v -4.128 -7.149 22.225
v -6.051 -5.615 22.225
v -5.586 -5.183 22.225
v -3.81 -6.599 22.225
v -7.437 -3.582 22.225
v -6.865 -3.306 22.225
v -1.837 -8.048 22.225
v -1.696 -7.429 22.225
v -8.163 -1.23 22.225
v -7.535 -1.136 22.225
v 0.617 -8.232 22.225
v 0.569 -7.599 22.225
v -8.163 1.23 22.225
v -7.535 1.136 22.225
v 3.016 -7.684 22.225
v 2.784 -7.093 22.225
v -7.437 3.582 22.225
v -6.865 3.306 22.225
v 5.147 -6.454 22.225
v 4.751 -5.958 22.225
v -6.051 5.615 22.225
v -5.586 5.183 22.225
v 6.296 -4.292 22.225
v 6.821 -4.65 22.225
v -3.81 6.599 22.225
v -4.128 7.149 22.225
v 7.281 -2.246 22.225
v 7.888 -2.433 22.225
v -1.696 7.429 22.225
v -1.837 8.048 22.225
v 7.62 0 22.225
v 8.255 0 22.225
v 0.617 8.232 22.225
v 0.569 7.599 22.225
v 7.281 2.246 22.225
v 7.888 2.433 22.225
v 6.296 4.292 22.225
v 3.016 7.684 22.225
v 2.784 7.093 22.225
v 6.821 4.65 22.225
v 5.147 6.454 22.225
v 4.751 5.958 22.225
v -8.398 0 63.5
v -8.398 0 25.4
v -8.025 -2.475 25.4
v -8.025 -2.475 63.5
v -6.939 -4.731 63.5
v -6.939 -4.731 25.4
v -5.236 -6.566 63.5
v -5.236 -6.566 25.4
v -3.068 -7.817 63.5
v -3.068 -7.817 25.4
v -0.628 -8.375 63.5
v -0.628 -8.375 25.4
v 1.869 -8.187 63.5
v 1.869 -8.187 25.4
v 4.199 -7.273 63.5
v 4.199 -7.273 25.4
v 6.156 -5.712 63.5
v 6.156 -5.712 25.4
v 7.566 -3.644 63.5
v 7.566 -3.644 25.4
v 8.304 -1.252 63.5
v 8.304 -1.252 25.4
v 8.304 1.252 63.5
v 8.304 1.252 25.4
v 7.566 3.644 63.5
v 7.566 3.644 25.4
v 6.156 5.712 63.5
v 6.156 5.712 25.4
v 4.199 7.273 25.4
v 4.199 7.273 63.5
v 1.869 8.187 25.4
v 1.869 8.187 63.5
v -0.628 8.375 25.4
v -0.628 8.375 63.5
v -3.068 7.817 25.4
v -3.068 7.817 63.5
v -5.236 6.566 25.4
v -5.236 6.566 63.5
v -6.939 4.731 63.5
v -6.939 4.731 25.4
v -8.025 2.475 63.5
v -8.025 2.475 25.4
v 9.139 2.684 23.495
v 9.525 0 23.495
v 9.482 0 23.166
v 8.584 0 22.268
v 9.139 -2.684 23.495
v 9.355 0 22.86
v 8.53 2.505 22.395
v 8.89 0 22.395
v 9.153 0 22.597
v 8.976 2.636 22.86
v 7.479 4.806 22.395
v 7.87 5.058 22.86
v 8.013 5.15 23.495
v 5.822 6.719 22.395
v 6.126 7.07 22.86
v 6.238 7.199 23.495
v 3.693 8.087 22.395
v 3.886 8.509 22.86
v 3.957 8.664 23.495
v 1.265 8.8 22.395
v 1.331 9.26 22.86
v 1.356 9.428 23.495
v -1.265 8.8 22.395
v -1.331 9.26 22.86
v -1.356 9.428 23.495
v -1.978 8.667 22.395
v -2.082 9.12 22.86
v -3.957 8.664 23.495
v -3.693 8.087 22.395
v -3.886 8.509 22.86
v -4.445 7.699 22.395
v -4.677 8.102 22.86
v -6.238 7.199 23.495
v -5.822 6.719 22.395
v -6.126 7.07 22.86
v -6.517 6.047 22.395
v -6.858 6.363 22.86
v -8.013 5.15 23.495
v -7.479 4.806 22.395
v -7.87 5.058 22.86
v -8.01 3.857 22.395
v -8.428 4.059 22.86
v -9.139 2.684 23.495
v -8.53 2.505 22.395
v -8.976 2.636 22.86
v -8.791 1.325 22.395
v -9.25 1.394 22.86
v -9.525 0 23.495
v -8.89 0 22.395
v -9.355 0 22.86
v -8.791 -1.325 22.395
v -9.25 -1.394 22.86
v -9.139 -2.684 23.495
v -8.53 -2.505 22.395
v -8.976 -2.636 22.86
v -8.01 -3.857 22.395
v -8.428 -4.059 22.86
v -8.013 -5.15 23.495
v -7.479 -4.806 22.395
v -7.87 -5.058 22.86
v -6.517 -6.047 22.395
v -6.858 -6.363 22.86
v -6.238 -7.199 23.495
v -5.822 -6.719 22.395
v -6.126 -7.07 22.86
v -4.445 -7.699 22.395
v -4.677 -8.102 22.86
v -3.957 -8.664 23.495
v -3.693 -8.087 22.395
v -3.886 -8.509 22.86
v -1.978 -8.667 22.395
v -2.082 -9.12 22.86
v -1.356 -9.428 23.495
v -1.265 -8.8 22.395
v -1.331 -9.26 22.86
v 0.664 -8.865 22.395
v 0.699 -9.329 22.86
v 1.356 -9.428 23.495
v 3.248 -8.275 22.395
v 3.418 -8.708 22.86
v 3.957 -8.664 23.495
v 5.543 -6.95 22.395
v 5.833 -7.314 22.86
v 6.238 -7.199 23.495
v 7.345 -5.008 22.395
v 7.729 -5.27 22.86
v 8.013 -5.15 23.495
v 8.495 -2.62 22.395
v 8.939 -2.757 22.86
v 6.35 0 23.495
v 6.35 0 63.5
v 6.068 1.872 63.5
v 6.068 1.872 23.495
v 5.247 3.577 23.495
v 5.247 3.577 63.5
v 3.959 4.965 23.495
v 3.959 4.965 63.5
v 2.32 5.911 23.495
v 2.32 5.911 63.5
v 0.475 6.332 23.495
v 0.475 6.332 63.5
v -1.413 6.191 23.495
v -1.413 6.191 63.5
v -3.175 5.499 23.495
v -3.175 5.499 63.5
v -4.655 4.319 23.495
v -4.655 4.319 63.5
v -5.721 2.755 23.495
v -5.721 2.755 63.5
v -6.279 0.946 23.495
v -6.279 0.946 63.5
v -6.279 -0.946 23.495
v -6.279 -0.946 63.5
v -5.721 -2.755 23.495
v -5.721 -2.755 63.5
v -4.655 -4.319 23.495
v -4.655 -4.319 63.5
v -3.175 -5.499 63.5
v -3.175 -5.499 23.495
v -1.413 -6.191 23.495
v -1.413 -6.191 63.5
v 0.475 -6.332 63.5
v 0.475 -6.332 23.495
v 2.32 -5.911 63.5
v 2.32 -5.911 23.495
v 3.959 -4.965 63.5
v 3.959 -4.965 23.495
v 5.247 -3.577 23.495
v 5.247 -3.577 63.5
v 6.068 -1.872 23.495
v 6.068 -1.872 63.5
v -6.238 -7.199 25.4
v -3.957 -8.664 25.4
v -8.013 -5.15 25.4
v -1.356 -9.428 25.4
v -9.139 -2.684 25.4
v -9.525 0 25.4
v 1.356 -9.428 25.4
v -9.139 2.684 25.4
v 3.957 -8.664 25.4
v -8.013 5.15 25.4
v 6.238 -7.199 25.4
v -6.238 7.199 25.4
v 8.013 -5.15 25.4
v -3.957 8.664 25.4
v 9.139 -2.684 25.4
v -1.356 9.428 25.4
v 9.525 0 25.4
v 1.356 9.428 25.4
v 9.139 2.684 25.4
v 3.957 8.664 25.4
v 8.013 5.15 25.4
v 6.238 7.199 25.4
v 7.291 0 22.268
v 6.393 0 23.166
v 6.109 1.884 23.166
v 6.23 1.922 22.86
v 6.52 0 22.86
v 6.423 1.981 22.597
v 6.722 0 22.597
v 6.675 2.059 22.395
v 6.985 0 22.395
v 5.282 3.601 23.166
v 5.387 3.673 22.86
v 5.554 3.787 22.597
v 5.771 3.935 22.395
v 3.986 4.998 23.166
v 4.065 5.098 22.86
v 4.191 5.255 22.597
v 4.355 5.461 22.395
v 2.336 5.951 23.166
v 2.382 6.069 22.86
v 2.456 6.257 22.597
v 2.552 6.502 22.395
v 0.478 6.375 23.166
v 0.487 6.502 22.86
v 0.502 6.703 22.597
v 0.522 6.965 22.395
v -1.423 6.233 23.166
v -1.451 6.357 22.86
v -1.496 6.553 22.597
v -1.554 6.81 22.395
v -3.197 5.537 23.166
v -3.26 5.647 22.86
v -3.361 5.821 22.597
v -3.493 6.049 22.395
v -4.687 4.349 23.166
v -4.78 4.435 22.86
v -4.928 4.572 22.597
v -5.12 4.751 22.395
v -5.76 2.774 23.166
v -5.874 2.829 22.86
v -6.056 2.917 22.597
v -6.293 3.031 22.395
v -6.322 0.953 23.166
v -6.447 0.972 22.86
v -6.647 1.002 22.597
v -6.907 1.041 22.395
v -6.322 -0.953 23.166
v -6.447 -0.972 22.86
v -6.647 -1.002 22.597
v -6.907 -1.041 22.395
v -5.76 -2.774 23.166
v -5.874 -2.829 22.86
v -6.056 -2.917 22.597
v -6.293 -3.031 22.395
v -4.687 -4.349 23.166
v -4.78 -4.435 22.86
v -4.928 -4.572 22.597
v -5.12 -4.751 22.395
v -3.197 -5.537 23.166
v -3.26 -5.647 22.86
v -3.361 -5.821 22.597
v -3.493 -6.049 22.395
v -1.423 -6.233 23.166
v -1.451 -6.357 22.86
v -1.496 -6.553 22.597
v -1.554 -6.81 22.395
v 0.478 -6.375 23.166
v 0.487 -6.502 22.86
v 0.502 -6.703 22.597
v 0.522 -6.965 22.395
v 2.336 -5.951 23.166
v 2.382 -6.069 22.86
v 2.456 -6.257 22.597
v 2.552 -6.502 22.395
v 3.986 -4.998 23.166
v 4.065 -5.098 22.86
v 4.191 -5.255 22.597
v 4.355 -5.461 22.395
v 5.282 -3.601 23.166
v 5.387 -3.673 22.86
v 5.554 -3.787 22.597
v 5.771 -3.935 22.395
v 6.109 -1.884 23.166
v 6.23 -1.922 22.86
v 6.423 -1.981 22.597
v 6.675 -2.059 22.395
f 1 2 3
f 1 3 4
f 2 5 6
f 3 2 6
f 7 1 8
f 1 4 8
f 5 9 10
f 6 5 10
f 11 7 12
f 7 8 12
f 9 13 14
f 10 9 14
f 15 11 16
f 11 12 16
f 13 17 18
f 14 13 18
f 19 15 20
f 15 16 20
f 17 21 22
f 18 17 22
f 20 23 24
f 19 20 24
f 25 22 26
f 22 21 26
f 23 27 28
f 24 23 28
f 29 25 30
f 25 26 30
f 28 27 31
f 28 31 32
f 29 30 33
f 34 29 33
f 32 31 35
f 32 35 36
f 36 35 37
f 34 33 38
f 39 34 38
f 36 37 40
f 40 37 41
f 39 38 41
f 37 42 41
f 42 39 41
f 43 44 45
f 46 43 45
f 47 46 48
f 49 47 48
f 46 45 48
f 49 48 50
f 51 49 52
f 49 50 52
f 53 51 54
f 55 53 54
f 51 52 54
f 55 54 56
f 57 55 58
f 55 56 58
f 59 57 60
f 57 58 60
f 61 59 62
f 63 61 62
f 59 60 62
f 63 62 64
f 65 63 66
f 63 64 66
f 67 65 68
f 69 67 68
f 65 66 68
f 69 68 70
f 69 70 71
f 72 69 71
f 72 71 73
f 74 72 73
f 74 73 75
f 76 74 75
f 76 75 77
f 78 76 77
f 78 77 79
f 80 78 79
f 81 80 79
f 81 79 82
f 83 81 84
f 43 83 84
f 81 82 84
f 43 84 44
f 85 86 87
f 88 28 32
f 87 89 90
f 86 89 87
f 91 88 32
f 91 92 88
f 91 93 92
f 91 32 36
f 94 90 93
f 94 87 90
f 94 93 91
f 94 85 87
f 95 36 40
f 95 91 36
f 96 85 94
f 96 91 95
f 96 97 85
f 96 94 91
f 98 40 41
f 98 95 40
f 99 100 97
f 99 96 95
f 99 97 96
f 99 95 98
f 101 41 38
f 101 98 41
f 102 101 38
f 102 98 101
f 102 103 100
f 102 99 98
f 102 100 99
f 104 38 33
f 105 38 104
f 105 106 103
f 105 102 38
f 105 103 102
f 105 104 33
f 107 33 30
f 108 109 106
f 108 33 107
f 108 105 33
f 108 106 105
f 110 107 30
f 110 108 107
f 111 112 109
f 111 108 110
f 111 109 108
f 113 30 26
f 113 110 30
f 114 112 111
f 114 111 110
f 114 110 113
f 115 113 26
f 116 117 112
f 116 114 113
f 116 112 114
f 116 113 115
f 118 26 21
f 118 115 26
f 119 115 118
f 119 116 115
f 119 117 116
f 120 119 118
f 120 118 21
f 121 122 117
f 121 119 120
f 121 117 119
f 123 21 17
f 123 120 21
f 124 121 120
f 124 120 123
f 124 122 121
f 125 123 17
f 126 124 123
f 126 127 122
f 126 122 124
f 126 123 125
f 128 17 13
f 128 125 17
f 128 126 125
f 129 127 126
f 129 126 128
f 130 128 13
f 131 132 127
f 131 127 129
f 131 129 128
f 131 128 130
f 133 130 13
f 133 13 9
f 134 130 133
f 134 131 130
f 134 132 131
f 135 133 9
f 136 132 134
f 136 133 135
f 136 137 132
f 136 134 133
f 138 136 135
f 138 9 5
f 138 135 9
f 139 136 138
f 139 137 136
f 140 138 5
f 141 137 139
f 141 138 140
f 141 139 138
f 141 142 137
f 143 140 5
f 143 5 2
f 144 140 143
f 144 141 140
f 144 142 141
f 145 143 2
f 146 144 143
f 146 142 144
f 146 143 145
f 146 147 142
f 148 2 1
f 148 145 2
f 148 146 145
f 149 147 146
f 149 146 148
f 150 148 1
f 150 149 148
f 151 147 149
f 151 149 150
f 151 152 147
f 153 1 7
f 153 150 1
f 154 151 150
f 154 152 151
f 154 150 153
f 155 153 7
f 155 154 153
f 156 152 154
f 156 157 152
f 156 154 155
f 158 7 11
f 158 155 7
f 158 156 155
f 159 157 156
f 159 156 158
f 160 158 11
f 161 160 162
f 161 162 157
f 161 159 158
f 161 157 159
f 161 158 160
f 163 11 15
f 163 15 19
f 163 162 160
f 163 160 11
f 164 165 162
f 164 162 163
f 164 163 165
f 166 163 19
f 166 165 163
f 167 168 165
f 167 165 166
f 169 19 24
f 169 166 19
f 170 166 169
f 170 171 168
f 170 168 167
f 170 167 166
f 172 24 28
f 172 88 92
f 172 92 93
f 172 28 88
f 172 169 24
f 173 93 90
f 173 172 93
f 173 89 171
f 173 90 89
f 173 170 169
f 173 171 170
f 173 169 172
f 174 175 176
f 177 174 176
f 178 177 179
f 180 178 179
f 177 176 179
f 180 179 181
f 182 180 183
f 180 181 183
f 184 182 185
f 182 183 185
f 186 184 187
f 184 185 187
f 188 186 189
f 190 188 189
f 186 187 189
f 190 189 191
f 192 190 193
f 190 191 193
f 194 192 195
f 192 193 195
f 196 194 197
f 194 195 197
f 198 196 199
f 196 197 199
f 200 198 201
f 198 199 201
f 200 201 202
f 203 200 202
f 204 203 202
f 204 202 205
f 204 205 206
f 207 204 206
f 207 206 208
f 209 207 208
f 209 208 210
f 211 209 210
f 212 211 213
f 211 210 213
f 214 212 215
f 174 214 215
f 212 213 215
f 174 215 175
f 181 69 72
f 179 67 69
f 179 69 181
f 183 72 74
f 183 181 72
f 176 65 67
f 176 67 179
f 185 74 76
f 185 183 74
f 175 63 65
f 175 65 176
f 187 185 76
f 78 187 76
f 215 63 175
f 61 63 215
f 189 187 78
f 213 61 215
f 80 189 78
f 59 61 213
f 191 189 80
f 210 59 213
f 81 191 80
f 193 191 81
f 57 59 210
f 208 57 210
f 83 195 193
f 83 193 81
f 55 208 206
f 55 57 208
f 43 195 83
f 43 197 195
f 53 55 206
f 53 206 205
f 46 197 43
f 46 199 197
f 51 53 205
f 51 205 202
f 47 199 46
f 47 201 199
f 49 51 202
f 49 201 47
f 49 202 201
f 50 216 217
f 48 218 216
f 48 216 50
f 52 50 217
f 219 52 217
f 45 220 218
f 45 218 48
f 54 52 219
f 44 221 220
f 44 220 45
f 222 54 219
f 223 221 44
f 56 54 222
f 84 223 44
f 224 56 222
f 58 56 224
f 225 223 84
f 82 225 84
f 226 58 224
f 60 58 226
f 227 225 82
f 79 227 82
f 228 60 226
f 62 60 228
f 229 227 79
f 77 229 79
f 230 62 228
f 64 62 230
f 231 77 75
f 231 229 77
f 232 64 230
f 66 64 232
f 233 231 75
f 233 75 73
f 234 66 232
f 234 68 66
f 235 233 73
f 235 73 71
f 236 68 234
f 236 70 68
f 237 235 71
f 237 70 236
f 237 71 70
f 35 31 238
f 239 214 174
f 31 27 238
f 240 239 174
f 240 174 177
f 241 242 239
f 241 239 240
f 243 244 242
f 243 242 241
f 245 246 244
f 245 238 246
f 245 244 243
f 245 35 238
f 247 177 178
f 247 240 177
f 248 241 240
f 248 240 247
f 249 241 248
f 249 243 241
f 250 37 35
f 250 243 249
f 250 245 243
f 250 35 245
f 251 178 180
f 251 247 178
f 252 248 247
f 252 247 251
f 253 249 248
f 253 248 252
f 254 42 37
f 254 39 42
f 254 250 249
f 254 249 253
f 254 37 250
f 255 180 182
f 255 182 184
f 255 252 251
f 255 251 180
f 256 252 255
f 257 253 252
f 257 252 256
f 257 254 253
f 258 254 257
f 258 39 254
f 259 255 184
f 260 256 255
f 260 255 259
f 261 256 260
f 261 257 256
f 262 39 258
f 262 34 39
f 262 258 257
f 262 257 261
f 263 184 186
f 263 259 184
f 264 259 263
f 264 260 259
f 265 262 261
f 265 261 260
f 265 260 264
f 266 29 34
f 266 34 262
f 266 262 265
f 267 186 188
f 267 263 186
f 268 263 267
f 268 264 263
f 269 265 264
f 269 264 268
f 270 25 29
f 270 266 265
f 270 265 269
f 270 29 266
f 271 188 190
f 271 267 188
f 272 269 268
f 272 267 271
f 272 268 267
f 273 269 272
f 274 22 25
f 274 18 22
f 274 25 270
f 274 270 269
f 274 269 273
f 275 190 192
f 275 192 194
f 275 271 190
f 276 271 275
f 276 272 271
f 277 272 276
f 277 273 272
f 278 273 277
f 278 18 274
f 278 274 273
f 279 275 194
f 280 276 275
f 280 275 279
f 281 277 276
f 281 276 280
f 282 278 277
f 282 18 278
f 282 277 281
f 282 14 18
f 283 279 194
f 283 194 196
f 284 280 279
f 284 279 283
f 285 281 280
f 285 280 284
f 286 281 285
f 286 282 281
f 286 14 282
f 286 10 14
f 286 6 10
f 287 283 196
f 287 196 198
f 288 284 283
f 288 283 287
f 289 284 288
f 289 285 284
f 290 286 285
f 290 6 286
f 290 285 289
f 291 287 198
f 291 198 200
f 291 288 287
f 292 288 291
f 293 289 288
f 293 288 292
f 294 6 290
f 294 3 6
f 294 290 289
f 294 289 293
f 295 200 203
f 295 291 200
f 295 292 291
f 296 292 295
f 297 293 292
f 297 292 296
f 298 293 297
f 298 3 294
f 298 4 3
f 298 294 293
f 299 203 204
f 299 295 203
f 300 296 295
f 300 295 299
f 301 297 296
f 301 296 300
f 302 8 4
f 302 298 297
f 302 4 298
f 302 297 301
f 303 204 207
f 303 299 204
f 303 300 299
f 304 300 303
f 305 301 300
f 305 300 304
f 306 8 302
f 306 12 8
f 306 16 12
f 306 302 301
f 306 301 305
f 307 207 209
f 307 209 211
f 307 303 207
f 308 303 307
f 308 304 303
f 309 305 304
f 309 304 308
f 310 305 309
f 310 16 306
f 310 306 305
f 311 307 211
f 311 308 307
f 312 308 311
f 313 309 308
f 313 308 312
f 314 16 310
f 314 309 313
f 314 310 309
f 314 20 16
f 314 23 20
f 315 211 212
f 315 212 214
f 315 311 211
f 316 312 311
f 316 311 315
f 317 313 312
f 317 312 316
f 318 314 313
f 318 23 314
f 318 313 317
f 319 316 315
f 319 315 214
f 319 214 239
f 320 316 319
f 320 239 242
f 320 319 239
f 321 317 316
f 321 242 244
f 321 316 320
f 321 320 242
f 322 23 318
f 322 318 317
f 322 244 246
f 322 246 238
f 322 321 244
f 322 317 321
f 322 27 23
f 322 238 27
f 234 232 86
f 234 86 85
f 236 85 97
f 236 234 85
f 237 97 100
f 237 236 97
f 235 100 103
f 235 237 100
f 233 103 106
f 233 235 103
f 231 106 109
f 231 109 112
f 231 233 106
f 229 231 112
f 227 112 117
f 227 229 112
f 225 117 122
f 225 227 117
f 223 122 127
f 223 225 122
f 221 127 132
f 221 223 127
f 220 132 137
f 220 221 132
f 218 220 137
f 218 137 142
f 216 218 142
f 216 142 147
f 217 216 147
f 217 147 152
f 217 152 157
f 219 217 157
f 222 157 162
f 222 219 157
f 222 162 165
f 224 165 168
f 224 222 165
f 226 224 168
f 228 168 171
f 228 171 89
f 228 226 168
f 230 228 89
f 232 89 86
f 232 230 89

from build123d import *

# Parameters (mm, degrees)
SKETCH2_R               = 8.398
BOSS_EXTRUDE3_DEPTH     = 38.1
SKETCH2_3_R             = 9.525
BOSS_EXTRUDE4_DEPTH     = 3.175
CUT_EXTRUDE1_DEPTH      = 41.411152545
CUT_EXTRUDE1_DEPTH_BACK = 41.411152545
SKETCH3_R               = 6.35
FILLET1_R               = 1.27


with BuildPart() as part:
    # Sketch2 → Boss-Extrude3 (new body)
    with BuildSketch(Plane.XY.offset(25.4)):
        Circle(SKETCH2_R)
    extrude(amount=BOSS_EXTRUDE3_DEPTH)


with BuildPart() as body_2:
    # Sketch2<3> → Boss-Extrude4 (new body)
    with BuildSketch(Plane.XY.offset(25.4)):
        Circle(SKETCH2_3_R)
    extrude(amount=-BOSS_EXTRUDE4_DEPTH)


with BuildPart() as cut_extrude1_tool:
    # Sketch3 → Cut-Extrude1 (new, two sides: drawn at the far end of the back side and taken through both)
    with BuildSketch(Plane.XY.offset(25.4).offset(-CUT_EXTRUDE1_DEPTH_BACK)):
        Circle(SKETCH3_R)
    extrude(amount=CUT_EXTRUDE1_DEPTH + CUT_EXTRUDE1_DEPTH_BACK)


with BuildPart() as part_1:
    add(part.part)

    # Cut-Extrude1: cut by cut_extrude1_tool
    add(cut_extrude1_tool.part, mode=Mode.SUBTRACT)


with BuildPart() as body_2_1:
    add(body_2.part)

    # Cut-Extrude1: cut by cut_extrude1_tool
    add(cut_extrude1_tool.part, mode=Mode.SUBTRACT)

    # Combine1: union part
    add(part_1.part)

    # Fillet1
    fillet1_edges = [body_2_1.edges().sort_by_distance(p)[0] for p in [
        (-9.525, 0, 22.225),
        (-6.35, 0, 22.225),
    ]]
    fillet(fillet1_edges, radius=FILLET1_R)


solid = body_2_1.part
